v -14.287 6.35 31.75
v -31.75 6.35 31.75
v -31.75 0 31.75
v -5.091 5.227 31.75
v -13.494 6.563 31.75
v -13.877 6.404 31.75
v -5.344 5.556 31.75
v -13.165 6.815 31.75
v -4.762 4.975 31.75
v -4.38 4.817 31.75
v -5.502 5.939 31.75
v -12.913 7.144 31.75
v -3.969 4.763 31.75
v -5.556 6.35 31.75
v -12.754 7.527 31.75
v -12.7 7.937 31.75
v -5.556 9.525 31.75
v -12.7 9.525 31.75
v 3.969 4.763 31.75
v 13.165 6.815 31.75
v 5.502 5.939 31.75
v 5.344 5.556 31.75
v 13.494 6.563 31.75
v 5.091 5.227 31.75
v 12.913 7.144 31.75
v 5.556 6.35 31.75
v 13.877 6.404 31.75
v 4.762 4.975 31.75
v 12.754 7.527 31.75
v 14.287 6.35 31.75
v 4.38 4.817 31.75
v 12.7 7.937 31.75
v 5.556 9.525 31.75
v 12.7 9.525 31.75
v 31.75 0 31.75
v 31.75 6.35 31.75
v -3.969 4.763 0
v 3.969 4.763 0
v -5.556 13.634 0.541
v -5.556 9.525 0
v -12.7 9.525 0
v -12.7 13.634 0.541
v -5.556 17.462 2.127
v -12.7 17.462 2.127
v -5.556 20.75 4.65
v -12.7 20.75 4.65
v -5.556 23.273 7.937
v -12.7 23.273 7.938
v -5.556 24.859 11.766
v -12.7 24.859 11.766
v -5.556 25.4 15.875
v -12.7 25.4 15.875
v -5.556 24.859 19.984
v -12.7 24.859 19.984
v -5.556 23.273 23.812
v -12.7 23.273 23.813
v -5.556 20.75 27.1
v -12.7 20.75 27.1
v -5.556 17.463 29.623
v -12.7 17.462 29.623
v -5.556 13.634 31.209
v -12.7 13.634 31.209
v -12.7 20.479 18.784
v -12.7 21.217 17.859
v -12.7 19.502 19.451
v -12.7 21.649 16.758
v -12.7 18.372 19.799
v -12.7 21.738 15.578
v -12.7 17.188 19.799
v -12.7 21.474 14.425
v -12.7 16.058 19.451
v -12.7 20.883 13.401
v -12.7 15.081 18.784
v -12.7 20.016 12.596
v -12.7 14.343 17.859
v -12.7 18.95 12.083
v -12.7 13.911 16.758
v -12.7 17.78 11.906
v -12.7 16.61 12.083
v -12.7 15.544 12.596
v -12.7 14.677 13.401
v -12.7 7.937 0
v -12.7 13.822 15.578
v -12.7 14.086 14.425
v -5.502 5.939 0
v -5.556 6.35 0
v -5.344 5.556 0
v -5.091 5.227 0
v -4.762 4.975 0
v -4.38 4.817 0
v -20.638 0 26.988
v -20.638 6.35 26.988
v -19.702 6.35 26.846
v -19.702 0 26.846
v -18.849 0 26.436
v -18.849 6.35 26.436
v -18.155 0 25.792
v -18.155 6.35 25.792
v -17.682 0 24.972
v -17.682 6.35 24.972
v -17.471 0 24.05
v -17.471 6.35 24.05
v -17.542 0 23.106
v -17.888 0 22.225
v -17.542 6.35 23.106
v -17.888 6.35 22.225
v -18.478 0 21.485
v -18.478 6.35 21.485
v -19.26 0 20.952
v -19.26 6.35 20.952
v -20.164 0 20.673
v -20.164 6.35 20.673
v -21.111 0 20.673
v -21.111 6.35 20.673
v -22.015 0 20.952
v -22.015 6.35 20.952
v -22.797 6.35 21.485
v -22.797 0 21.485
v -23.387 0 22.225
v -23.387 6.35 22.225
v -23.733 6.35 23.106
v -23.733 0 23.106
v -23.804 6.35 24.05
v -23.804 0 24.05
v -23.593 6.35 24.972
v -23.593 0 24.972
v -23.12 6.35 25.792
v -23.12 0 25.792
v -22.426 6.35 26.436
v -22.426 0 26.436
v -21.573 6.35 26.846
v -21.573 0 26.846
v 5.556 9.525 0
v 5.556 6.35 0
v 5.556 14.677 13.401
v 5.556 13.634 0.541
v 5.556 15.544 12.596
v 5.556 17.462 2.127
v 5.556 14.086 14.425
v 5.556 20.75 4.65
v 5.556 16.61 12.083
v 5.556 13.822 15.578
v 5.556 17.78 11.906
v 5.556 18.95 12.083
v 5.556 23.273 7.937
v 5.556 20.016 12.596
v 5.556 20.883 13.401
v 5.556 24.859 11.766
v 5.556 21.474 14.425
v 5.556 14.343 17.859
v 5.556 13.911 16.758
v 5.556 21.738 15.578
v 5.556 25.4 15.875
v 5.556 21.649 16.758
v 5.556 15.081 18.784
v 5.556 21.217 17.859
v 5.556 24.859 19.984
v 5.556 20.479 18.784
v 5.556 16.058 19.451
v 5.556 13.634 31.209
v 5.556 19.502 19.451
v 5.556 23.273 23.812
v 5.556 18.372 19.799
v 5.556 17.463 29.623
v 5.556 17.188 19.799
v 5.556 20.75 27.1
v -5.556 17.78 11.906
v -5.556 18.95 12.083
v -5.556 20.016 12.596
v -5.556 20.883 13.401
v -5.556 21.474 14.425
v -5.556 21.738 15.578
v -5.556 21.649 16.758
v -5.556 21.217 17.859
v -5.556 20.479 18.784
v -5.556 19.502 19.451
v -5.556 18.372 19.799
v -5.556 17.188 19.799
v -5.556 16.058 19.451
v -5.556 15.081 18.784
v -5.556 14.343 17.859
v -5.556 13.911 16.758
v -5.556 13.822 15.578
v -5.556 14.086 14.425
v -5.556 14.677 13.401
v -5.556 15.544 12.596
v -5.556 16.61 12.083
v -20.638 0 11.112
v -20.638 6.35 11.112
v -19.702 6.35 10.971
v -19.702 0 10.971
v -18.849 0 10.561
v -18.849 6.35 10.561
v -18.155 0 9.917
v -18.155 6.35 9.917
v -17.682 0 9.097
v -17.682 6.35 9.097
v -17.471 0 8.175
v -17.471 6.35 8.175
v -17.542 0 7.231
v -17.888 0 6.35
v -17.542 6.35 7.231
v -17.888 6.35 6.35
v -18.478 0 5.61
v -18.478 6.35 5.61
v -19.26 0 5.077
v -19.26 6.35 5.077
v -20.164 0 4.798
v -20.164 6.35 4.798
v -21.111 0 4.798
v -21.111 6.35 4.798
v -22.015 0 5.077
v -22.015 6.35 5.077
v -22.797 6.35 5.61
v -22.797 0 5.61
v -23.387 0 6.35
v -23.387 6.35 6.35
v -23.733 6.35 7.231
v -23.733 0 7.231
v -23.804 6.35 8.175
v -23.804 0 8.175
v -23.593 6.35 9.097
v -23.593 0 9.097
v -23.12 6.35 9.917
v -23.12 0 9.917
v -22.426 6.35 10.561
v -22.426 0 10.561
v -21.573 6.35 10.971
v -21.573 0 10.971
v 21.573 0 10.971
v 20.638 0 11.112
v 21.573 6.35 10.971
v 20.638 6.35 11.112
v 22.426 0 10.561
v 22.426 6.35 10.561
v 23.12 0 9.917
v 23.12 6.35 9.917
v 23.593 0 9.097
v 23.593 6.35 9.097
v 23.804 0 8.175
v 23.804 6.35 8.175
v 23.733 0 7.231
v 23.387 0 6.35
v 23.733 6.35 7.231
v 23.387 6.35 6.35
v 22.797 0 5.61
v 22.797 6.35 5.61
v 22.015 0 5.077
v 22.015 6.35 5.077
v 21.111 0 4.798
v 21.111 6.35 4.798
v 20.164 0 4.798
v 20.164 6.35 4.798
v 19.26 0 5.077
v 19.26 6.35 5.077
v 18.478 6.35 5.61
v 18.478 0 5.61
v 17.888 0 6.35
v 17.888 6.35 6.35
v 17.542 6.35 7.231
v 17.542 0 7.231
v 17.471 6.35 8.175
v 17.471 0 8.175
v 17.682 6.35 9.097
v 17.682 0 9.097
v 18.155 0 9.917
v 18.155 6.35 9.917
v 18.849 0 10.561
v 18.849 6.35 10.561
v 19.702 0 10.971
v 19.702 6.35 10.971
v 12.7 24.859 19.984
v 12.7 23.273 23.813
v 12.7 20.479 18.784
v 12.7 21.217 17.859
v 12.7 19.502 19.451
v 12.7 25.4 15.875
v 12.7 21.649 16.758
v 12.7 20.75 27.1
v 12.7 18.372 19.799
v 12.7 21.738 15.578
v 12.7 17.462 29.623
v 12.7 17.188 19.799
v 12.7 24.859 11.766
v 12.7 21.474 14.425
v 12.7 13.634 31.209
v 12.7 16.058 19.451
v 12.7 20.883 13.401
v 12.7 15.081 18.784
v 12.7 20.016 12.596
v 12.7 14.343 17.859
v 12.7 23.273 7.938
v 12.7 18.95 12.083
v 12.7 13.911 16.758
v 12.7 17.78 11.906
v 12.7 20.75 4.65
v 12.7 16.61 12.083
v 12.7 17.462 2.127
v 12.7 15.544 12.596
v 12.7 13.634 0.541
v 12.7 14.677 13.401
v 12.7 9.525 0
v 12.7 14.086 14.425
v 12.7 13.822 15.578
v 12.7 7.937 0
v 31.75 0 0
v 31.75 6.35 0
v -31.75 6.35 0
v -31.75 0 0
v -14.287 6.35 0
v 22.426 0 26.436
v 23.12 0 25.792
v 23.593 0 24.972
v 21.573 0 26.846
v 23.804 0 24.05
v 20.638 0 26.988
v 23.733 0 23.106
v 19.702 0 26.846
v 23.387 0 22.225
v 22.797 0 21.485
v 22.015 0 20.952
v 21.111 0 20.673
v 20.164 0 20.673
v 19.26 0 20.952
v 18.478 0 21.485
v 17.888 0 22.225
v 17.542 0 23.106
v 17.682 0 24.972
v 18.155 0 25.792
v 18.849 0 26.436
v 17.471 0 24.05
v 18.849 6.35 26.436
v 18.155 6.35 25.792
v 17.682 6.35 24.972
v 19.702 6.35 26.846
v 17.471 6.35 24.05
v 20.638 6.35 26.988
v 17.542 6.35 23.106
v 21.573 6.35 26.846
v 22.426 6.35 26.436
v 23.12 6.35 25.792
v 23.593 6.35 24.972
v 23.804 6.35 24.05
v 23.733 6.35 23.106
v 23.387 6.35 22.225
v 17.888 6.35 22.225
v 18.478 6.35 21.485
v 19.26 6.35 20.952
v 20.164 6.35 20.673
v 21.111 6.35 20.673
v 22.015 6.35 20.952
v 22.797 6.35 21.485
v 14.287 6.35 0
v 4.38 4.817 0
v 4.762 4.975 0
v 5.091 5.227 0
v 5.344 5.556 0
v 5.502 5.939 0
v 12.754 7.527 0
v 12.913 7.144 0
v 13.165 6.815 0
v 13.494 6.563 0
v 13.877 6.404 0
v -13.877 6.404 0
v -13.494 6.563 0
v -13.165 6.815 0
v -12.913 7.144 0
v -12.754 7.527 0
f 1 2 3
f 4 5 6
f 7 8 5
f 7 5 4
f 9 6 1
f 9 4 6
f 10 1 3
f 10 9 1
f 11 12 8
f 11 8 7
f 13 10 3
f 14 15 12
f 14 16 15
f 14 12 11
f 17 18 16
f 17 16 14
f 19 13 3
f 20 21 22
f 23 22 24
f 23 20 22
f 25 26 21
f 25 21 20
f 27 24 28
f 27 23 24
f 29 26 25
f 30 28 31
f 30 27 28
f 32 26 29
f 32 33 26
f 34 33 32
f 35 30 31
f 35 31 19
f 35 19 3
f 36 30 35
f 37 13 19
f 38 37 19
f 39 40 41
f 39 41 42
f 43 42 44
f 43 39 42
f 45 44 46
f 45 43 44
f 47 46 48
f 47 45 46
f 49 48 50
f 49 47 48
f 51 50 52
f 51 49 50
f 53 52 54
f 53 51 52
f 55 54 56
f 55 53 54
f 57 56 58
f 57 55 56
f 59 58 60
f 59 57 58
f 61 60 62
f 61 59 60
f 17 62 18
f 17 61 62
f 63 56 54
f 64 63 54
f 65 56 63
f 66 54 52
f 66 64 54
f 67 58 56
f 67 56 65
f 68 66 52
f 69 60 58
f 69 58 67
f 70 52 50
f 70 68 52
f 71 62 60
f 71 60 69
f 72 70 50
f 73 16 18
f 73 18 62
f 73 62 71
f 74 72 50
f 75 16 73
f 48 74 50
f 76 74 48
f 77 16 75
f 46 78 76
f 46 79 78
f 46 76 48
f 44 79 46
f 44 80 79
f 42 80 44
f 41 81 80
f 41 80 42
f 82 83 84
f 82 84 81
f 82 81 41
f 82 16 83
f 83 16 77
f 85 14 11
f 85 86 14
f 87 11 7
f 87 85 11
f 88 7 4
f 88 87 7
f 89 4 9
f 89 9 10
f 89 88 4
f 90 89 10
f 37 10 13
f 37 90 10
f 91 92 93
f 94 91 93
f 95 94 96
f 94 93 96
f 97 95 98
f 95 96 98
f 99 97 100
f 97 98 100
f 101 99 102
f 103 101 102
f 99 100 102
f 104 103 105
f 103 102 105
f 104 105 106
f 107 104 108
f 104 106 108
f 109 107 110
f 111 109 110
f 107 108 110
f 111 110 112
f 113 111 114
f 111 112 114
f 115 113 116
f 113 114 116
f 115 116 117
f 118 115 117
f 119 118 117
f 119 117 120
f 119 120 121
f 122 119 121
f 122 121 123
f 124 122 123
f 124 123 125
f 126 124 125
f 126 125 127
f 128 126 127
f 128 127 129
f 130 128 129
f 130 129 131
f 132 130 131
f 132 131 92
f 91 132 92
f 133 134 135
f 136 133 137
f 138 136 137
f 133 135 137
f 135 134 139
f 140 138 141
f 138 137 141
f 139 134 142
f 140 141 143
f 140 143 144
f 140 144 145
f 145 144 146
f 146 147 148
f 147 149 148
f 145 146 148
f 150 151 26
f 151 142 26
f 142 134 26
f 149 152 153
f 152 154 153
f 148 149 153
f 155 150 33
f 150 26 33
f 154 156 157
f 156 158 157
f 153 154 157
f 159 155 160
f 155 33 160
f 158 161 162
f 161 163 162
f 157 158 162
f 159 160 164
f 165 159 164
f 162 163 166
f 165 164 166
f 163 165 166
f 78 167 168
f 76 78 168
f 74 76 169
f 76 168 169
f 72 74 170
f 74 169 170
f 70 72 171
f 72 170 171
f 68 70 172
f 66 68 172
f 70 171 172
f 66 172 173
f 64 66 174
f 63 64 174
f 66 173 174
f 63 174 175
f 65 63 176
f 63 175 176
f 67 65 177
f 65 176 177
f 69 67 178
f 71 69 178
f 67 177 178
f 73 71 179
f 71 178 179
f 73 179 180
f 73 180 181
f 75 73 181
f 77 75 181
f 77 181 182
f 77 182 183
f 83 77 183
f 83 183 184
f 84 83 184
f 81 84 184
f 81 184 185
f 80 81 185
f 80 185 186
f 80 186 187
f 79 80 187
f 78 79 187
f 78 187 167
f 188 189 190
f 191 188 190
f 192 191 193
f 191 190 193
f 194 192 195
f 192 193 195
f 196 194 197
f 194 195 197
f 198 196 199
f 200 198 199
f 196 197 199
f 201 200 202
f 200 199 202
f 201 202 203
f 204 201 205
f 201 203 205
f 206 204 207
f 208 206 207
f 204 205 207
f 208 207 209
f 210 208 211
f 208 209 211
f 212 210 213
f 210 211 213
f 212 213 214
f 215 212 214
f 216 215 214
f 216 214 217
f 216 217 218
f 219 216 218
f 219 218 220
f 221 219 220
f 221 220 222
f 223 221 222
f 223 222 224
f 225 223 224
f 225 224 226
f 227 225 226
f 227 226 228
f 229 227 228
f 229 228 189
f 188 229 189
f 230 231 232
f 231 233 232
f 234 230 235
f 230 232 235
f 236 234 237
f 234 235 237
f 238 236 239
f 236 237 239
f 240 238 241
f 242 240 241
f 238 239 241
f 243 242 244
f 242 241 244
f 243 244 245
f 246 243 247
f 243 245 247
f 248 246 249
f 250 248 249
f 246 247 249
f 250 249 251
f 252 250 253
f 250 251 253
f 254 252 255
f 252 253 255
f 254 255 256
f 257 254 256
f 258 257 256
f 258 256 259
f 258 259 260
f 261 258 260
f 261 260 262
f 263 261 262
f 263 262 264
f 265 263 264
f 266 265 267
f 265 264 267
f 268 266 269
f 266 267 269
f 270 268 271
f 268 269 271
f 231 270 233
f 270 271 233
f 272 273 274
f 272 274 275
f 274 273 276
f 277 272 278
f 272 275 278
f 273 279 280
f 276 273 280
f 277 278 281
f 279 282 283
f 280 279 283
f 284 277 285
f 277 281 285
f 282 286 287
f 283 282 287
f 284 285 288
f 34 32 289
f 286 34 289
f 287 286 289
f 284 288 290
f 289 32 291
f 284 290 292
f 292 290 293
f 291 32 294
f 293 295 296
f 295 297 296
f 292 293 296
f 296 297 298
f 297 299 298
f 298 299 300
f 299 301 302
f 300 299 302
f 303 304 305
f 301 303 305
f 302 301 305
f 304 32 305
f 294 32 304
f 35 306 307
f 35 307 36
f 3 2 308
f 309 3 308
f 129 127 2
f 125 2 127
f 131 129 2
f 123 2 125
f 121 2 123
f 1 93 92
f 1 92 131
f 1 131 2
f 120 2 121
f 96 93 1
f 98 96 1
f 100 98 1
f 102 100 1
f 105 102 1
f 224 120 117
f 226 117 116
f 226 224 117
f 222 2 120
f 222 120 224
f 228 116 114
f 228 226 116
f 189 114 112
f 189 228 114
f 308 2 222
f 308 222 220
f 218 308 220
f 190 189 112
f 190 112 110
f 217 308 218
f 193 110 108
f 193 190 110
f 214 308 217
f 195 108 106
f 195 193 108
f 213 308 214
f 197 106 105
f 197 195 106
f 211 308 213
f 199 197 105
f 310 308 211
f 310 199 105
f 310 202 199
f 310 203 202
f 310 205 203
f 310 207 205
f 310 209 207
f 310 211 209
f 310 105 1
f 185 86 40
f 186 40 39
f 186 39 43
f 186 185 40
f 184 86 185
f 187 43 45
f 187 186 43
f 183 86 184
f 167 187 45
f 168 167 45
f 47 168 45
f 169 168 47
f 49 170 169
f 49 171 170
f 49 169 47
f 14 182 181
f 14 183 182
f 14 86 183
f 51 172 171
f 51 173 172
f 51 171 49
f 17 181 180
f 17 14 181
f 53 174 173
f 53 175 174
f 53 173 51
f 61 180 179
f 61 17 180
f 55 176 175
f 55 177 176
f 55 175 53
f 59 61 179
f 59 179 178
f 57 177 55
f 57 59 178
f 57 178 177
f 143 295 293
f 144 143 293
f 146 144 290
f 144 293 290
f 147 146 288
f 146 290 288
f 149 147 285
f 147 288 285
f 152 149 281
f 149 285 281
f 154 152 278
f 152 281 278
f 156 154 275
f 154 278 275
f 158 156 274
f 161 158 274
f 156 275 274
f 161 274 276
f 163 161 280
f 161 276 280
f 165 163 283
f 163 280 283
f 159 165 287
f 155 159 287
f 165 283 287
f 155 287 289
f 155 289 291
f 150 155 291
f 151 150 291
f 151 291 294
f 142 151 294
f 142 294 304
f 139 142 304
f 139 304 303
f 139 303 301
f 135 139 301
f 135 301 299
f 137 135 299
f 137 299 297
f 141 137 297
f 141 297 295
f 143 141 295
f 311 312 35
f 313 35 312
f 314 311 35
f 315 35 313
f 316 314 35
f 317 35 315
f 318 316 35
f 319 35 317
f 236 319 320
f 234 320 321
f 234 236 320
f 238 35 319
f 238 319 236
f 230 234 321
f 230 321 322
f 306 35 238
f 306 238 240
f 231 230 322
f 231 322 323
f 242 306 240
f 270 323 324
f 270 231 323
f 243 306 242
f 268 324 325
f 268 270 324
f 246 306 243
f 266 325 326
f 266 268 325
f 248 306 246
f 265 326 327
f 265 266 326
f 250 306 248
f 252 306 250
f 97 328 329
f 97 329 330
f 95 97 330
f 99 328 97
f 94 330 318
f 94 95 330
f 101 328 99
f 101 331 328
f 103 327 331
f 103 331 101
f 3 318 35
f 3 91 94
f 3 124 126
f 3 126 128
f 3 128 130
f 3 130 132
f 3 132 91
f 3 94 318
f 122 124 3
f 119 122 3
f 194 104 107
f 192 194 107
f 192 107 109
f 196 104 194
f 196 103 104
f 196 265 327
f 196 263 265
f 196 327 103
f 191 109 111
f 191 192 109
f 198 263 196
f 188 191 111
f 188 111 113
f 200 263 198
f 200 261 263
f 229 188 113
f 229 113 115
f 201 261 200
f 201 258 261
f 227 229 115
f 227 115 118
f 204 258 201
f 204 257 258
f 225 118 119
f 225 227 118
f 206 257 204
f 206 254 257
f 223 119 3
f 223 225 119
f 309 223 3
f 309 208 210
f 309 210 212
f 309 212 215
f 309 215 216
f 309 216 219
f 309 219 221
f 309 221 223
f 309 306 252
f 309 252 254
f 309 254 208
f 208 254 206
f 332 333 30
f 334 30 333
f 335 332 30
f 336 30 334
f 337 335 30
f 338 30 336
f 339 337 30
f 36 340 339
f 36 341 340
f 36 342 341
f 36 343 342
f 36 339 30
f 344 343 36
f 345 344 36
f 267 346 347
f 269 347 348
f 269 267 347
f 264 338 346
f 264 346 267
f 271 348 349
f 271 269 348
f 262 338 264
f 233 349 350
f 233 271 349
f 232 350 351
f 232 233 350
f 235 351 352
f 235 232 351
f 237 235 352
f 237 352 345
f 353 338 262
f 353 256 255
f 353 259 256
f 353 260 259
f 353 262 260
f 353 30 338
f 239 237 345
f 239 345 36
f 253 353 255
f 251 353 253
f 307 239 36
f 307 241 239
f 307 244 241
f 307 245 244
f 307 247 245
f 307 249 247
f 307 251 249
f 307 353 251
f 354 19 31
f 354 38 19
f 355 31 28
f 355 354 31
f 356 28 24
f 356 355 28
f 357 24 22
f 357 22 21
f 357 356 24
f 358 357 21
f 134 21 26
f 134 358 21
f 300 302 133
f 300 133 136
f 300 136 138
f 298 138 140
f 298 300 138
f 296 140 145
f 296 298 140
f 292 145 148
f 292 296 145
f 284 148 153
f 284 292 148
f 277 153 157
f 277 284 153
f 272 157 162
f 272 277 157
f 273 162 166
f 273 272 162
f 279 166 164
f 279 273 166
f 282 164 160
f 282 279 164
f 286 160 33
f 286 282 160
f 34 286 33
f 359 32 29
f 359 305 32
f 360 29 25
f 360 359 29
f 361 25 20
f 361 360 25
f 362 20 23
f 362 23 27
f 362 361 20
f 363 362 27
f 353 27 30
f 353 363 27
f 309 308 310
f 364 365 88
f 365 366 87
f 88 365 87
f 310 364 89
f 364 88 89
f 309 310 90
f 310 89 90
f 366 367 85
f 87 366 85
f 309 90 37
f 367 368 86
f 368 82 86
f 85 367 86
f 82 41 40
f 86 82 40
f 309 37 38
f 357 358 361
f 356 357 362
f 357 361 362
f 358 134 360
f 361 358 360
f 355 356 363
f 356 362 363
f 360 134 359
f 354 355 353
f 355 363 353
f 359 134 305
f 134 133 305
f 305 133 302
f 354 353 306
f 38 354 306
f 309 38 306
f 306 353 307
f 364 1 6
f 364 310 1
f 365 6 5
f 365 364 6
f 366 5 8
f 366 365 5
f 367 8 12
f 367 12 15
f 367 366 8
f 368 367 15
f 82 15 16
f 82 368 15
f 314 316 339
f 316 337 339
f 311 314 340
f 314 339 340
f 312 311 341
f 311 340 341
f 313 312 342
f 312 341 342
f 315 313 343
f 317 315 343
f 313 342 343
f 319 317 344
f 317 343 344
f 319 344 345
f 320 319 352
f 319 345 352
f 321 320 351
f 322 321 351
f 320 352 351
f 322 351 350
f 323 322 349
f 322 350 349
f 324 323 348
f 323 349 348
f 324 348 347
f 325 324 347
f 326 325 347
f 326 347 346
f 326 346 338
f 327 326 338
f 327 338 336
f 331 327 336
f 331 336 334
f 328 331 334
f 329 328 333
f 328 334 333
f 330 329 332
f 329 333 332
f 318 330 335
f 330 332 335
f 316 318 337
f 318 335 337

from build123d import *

# Parameters (mm, degrees)
BOSS_EXTRUDE1_DEPTH = 4.7625
SKETCH2_W           = 25.4
SKETCH2_H           = 31.75
BOSS_EXTRUDE2_DEPTH = 20.6375
SKETCH4_R           = 3.96875
CUT_EXTRUDE2_DEPTH  = 61.241389426
FILLET2_RADIUS      = 15.875
FILLET2_LENGTH      = 25.4
SKETCH5_W           = 11.1125
SKETCH5_H           = 24.885554027
CUT_EXTRUDE3_DEPTH  = 52.587643869
SKETCH6_R           = 3.175
CUT_EXTRUDE4_DEPTH  = 50.416914172
BOSS_EXTRUDE3_START = 1.5875
SKETCH10_W          = 19.05
SKETCH10_H          = 31.75
SKETCH10_R          = 3.175
BOSS_EXTRUDE3_DEPTH = 1.5875
FILLET3_R           = 1.5875


with BuildPart() as part:
    # Sketch1 → Boss-Extrude1 (new body)
    with BuildSketch(Plane(origin=(0, 0, 0), x_dir=(1, 0, 0), z_dir=(0, 1, 0))):
        Polygon((-31.75, 0), (31.75, 0), (31.75, -31.75), (15.875, -31.75), (-15.875, -31.75), (-31.75, -31.75), align=None)
    extrude(amount=BOSS_EXTRUDE1_DEPTH)

    # Sketch2 → Boss-Extrude2 (add)
    with BuildSketch(Plane(origin=(0, 4.7625, 0), x_dir=(1, 0, 0), z_dir=(0, 1, 0))):
        with Locations((0, -15.875)):
            Rectangle(SKETCH2_W, SKETCH2_H)
    extrude(amount=BOSS_EXTRUDE2_DEPTH)

    # Sketch4 → Cut-Extrude2 (cut, through all)
    with BuildSketch(Plane(origin=(12.7, 0, 0), x_dir=(0, 0, -1), z_dir=(1, 0, 0))):
        with Locations((-15.875, 17.78)):
            Circle(SKETCH4_R)
    extrude(amount=-CUT_EXTRUDE2_DEPTH, mode=Mode.SUBTRACT)

    # Fillet2: full round fillet: the end face becomes a half cylinder, R = half its width
    fillet2_face = Plane((0, 25.4, 15.875), x_dir=(1, 0, 0), z_dir=(0, 1, 0))  # on the end face: x along it, z out of the body
    fillet2_slab = fillet2_face.offset(-FILLET2_RADIUS / 2) * Box(FILLET2_LENGTH, 2 * FILLET2_RADIUS, FILLET2_RADIUS, mode=Mode.PRIVATE)  # the body's end, R deep
    fillet2_round = Plane((0, 9.525, 15.875), x_dir=(0, 1, 0), z_dir=(1, 0, 0)) * Cylinder(FILLET2_RADIUS, FILLET2_LENGTH, mode=Mode.PRIVATE)  # its axis R under the face
    add(fillet2_slab - fillet2_round, mode=Mode.SUBTRACT)

    # Sketch5 → Cut-Extrude3 (cut, through all)
    with BuildSketch(Plane.XY.offset(31.75)):
        with Locations((0, 17.205277014)):
            Rectangle(SKETCH5_W, SKETCH5_H)
    extrude(amount=-CUT_EXTRUDE3_DEPTH, mode=Mode.SUBTRACT)

    # Sketch6 → Cut-Extrude4 (cut, through all)
    with BuildSketch(Plane(origin=(0, 4.7625, 0), x_dir=(1, 0, 0), z_dir=(0, 1, 0))):
        with Locations(Location((-20.6375, -7.9375, 0), (0, 0, 270))):
            Circle(SKETCH6_R)
        with Locations(Location((20.6375, -7.9375, 0), (0, 0, 270))):
            Circle(SKETCH6_R)
        with Locations(Location((20.6375, -23.8125, 0), (0, 0, 270))):
            Circle(SKETCH6_R)
        with Locations(Location((-20.6375, -23.8125, 0), (0, 0, 270))):
            Circle(SKETCH6_R)
    extrude(amount=-CUT_EXTRUDE4_DEPTH, mode=Mode.SUBTRACT)

    # Sketch10 → Boss-Extrude3 (add)
    # profile 1 of 2: a face of its own
    with BuildSketch(Plane(origin=(0, 4.7625, 0), x_dir=(1, 0, 0), z_dir=(0, 1, 0)).offset(BOSS_EXTRUDE3_START)):
        with Locations((-22.225, -15.875)):
            Rectangle(SKETCH10_W, SKETCH10_H)
        with Locations(Location((-20.6375, -23.8125, 0), (0, 0, 270))):
            Circle(SKETCH10_R, mode=Mode.SUBTRACT)
        with Locations(Location((-20.6375, -7.9375, 0), (0, 0, 270))):
            Circle(SKETCH10_R, mode=Mode.SUBTRACT)
    # profile 2 of 2: a face of its own
    with BuildSketch(Plane(origin=(0, 4.7625, 0), x_dir=(1, 0, 0), z_dir=(0, 1, 0)).offset(BOSS_EXTRUDE3_START)):
        with Locations((22.225, -15.875)):
            Rectangle(SKETCH10_W, SKETCH10_H)
        with Locations(Location((20.6375, -7.9375, 0), (0, 0, 270))):
            Circle(SKETCH10_R, mode=Mode.SUBTRACT)
        with Locations(Location((20.6375, -23.8125, 0), (0, 0, 270))):
            Circle(SKETCH10_R, mode=Mode.SUBTRACT)
    extrude(amount=-BOSS_EXTRUDE3_DEPTH)

    # Fillet3
    fillet3_edges = [part.edges().sort_by_distance(p)[0] for p in [
        (12.7, 6.35, 15.875),
        (5.55625, 4.7625, 15.875),
        (-5.55625, 4.7625, 15.875),
        (-12.7, 6.35, 15.875),
    ]]
    fillet(fillet3_edges, radius=FILLET3_R)


solid = part.part
